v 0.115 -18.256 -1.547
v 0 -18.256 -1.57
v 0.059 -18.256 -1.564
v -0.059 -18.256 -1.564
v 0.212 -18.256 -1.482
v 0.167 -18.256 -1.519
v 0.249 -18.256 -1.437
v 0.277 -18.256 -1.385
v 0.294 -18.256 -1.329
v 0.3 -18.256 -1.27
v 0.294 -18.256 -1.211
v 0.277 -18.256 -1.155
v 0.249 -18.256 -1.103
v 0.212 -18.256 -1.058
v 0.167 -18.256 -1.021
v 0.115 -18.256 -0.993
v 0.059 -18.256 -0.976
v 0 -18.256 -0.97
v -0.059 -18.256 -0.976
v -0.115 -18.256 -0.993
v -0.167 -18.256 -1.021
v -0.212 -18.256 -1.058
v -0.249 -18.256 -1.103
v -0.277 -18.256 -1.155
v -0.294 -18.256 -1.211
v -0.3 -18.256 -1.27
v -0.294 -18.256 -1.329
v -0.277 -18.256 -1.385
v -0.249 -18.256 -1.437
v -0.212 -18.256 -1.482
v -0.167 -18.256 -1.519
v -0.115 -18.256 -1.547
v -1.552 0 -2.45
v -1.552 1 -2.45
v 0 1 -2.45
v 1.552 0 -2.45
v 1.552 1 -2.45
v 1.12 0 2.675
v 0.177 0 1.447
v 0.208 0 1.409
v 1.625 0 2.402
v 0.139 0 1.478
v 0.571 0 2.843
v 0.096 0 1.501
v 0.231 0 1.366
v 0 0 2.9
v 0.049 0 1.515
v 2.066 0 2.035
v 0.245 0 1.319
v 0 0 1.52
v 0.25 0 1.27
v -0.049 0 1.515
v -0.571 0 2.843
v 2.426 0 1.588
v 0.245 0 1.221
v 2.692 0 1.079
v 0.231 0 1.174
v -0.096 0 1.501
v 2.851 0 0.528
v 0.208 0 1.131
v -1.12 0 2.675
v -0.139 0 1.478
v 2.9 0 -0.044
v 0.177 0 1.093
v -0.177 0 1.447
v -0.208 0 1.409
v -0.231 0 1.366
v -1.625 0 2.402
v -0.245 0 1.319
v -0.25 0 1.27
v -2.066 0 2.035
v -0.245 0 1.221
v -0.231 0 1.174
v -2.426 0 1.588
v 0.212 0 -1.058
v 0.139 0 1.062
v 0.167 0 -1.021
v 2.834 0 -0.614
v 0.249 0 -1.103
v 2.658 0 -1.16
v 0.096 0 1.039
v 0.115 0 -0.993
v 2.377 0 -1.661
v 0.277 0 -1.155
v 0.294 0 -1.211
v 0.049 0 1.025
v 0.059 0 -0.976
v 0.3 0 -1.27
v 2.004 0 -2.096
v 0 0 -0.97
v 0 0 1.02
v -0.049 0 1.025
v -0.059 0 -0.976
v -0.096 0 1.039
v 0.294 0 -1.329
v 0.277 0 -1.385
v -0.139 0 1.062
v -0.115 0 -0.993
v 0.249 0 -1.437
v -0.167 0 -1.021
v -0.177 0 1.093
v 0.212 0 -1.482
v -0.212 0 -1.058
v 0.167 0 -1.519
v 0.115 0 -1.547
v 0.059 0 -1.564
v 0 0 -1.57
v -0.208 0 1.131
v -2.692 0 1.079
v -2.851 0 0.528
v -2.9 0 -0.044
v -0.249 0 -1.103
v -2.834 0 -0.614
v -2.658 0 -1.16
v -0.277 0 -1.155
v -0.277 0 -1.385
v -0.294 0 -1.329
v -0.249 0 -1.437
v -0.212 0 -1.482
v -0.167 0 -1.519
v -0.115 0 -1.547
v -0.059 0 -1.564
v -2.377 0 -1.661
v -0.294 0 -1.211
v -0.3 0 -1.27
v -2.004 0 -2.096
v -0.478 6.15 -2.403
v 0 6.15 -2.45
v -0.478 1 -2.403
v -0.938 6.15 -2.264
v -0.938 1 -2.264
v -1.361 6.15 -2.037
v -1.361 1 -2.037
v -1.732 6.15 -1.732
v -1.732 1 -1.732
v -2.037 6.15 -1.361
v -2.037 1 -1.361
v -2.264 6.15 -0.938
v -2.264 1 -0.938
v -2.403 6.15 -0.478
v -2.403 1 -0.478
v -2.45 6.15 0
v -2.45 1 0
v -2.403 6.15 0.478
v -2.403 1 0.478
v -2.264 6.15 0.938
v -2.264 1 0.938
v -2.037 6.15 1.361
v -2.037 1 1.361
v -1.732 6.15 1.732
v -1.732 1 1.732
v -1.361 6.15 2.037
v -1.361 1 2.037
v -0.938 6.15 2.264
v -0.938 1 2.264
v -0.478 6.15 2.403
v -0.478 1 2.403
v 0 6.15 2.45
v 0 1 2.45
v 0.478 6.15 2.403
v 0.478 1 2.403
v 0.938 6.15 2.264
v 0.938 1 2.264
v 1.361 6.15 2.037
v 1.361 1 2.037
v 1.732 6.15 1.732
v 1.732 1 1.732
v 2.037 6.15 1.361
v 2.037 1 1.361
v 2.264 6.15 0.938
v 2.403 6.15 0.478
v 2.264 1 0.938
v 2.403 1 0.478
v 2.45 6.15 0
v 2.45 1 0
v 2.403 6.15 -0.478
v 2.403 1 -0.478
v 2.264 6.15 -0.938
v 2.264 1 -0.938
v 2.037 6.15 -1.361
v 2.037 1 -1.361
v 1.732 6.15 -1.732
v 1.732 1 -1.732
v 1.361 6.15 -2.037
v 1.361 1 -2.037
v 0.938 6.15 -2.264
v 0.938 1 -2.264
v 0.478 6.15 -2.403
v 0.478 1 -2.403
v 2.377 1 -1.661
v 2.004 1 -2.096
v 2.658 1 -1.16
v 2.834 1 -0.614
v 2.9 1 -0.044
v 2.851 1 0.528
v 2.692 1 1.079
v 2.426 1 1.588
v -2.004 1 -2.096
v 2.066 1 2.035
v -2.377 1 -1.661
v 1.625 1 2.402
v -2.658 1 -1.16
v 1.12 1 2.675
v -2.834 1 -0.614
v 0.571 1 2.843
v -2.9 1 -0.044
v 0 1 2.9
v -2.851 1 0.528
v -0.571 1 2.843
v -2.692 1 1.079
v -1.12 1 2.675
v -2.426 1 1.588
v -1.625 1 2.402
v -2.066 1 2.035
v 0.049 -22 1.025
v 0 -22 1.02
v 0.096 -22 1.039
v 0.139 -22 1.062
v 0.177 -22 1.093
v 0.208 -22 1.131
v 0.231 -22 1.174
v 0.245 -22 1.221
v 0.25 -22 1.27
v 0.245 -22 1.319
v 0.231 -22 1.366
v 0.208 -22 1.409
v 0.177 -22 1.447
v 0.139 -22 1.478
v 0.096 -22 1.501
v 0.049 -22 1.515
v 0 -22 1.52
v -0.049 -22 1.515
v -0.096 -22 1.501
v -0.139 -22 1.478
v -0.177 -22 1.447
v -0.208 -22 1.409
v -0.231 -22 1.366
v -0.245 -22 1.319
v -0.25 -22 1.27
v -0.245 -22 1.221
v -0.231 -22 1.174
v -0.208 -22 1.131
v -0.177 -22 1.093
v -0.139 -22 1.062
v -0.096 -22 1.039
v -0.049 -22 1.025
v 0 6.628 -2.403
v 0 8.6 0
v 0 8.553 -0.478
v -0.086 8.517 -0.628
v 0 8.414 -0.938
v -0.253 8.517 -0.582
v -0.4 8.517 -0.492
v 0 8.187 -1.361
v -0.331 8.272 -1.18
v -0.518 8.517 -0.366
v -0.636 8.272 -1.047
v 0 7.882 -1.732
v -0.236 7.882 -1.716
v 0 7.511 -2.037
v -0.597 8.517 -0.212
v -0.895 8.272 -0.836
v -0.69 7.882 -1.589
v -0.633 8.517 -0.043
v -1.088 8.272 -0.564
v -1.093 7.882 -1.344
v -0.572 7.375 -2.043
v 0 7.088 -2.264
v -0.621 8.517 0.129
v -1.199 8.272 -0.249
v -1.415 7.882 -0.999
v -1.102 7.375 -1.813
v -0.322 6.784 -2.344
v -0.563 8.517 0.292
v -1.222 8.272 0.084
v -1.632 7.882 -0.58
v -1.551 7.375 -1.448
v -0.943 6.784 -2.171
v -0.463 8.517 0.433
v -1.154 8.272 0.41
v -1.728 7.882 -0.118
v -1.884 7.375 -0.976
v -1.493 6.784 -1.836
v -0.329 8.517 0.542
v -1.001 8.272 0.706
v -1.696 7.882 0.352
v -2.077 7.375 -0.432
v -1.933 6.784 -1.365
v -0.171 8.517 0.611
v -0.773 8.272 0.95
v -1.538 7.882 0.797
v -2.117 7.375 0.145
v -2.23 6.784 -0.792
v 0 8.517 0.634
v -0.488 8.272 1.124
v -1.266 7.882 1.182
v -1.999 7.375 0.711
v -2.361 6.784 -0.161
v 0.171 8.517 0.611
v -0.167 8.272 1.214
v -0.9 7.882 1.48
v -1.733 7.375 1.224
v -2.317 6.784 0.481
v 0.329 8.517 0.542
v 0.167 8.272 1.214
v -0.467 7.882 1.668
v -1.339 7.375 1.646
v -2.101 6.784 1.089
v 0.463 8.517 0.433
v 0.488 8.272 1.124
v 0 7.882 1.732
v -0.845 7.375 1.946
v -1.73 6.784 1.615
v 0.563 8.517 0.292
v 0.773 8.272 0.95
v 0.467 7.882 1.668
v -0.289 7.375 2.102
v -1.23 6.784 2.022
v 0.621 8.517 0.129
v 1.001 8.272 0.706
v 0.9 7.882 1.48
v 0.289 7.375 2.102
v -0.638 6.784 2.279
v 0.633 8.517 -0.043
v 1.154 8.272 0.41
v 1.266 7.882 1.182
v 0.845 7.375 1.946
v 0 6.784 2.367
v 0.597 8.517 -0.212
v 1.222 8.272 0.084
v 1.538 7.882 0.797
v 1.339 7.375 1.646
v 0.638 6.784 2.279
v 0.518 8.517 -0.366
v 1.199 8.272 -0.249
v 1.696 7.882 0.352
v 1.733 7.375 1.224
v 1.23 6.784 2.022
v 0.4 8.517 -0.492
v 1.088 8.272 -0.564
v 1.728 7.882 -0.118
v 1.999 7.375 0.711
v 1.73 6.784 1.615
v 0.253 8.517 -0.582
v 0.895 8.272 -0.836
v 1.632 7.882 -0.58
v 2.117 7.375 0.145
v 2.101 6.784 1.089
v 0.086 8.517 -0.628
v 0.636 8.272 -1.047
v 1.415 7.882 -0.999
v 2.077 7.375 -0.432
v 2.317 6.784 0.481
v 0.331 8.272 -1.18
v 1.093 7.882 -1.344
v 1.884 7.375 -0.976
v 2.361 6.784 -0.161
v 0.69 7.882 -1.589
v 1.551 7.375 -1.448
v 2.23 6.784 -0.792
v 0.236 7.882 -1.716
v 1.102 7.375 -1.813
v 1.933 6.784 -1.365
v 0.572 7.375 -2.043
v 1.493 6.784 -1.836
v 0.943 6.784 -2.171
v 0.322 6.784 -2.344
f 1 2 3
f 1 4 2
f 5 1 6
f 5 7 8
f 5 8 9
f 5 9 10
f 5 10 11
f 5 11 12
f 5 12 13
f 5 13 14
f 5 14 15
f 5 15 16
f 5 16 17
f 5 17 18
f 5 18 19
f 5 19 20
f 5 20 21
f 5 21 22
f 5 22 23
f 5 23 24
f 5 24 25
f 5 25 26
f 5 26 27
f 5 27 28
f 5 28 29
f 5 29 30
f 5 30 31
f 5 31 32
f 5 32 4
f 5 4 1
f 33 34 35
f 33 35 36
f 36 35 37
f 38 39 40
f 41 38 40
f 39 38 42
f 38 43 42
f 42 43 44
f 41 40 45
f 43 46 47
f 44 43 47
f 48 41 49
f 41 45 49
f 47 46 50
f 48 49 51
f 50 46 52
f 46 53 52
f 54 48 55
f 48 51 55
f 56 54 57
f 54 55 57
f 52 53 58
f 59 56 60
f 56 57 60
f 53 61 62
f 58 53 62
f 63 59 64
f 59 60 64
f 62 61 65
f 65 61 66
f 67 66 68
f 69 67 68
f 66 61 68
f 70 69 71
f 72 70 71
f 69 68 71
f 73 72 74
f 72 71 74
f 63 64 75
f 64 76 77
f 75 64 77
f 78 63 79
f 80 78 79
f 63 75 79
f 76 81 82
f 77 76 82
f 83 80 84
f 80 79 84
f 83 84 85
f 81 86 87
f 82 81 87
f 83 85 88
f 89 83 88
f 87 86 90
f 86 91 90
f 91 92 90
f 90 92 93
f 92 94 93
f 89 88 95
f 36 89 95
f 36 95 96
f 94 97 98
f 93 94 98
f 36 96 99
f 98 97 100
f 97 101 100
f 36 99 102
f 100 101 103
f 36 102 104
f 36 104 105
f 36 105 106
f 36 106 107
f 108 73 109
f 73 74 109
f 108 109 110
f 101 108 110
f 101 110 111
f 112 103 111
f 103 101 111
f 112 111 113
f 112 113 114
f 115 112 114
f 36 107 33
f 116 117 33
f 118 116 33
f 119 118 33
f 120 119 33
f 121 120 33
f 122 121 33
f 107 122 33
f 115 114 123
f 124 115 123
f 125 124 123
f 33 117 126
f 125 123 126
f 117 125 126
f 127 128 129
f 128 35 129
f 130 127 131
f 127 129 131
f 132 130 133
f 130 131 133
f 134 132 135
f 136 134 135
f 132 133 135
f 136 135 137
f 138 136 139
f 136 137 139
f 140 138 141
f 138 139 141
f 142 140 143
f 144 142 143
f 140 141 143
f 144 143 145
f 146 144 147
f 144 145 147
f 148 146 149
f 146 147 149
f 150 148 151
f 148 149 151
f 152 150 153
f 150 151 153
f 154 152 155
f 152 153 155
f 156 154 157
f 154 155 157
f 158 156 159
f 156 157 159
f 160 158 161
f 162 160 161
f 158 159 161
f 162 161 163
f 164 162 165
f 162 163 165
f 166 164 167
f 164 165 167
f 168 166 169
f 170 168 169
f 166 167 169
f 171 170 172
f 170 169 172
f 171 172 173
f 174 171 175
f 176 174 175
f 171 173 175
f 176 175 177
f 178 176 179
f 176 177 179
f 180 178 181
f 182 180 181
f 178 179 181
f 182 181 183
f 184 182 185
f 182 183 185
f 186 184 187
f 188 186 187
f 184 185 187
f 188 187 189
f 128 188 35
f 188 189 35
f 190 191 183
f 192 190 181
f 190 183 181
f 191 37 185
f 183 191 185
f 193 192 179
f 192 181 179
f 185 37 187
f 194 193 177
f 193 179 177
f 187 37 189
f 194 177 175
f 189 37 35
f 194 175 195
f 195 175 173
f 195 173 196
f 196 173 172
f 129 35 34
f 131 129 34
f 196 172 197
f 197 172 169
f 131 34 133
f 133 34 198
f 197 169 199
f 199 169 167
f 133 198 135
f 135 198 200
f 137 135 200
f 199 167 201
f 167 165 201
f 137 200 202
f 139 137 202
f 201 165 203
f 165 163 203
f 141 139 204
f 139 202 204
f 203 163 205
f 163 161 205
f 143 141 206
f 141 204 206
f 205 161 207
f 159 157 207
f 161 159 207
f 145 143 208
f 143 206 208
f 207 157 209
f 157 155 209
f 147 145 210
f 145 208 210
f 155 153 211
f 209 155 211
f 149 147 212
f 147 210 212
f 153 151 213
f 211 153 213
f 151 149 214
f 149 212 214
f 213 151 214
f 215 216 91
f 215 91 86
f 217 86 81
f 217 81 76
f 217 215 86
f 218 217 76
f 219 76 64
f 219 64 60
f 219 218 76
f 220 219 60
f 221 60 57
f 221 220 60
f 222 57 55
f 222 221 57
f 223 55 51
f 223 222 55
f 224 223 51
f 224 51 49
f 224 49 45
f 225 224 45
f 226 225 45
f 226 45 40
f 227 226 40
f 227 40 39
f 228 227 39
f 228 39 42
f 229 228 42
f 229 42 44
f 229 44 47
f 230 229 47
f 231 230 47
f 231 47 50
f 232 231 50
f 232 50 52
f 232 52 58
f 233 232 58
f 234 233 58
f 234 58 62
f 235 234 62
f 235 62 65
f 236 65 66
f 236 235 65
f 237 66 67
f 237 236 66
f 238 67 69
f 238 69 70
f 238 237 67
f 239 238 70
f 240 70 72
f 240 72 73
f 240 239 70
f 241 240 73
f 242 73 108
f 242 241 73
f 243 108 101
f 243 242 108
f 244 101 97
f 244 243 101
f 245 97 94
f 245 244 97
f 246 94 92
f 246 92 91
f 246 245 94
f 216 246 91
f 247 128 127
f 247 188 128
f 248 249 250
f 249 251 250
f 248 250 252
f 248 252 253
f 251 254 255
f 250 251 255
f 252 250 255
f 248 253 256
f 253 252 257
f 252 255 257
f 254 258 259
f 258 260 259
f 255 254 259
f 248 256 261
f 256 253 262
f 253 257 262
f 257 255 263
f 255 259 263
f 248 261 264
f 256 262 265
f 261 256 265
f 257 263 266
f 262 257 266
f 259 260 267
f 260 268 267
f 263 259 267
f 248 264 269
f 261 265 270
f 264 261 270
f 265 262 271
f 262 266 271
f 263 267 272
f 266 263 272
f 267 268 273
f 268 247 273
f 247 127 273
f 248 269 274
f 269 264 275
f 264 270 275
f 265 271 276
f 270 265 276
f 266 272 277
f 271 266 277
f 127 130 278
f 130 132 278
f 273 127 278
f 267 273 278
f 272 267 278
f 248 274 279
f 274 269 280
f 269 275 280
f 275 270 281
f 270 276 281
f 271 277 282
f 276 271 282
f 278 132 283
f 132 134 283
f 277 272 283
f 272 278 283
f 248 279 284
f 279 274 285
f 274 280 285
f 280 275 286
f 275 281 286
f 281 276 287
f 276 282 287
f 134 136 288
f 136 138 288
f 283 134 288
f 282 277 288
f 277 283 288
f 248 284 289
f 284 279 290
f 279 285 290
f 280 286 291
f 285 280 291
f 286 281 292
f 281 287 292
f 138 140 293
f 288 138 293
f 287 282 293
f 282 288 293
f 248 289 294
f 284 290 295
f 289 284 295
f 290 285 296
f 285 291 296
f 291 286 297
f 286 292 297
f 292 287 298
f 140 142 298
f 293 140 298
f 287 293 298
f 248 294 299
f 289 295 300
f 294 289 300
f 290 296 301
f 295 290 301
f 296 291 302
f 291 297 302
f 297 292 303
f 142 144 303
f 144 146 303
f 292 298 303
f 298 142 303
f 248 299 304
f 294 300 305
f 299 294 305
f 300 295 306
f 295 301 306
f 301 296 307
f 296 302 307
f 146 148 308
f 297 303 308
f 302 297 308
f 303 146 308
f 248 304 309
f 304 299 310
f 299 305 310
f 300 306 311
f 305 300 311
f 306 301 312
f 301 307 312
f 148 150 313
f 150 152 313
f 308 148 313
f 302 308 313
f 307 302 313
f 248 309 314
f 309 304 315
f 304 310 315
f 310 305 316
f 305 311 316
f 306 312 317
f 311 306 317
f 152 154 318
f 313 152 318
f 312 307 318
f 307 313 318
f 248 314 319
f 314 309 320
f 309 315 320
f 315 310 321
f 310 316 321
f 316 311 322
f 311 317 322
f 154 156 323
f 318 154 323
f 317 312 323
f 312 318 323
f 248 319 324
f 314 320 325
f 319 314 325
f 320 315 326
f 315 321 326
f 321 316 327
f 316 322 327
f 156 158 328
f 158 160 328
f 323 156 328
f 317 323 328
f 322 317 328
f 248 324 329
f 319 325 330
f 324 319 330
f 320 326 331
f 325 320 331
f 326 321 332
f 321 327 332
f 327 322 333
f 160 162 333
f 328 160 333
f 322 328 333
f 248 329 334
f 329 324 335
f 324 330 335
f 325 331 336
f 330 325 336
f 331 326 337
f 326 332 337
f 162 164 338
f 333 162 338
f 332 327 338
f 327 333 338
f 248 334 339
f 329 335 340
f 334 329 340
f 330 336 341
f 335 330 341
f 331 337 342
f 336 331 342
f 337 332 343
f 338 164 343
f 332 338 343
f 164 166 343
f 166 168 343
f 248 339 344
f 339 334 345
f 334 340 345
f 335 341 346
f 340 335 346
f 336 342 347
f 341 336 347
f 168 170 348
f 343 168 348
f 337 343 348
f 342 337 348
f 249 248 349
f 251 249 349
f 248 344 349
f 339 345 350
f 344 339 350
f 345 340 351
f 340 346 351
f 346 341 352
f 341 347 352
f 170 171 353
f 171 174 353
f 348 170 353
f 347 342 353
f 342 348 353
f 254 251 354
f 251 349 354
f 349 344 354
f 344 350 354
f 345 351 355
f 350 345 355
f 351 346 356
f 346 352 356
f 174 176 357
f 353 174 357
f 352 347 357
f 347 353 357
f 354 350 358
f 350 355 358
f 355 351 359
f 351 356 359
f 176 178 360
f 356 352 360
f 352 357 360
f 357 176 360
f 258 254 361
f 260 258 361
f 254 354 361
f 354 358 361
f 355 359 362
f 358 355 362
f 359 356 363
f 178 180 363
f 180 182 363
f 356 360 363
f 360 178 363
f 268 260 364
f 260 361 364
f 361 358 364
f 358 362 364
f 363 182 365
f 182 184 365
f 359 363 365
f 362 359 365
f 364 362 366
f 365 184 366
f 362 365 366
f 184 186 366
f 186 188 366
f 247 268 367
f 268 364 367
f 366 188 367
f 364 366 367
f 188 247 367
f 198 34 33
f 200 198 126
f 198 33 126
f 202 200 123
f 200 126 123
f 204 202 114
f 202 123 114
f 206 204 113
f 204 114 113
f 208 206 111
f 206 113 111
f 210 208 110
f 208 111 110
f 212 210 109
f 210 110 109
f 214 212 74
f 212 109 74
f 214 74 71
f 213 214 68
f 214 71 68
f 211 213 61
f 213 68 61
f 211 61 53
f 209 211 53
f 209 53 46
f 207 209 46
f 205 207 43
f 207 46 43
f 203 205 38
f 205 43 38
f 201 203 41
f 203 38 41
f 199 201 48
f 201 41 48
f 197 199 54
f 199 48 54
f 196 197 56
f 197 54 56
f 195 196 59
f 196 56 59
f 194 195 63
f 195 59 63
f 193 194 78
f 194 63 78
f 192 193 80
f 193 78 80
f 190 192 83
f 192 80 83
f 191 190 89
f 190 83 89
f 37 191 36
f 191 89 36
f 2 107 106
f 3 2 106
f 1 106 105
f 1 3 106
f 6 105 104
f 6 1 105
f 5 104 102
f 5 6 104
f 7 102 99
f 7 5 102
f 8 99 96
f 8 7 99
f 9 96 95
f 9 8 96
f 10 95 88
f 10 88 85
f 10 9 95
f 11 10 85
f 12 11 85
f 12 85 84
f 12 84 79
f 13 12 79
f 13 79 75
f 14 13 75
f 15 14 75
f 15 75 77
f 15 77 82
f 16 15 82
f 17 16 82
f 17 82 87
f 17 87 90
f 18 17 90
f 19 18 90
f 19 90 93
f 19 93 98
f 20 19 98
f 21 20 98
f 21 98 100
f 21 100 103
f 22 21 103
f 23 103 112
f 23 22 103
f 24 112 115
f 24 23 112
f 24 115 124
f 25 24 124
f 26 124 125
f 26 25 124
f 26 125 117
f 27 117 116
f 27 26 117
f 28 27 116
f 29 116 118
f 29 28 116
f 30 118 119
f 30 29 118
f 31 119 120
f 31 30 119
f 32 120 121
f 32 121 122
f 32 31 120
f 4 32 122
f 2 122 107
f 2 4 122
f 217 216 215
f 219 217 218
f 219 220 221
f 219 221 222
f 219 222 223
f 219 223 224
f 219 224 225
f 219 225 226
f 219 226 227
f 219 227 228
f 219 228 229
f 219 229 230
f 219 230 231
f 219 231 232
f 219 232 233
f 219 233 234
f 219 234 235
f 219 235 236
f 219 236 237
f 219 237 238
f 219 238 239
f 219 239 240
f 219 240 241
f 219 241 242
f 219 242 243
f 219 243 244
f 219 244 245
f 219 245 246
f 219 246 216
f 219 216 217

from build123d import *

# Parameters (mm, degrees)
CUT_EXTRUDE1_DEPTH = 10
SWEEP1_PROFILE_R   = 0.3
SWEEP2_PROFILE_R   = 0.25


with BuildPart() as part:
    # Sketch1 → Revolve1 (revolve)
    with BuildSketch(Plane(origin=(0, 0, 0), x_dir=(0, 0, -1), z_dir=(1, 0, 0))):
        with BuildLine():
            Line((0, 0), (0, 8.6))
            ThreePointArc((0, 8.6), (1.732411614, 7.882411614), (2.45, 6.15))
            Line((2.45, 6.15), (2.45, 1))
            Line((2.45, 1), (2.9, 1))
            Line((2.9, 1), (2.9, 0))
            Line((2.9, 0), (0, 0))
        make_face()
    revolve(axis=Axis((0, 0, 0), (0, 1, 0)))

    # Sketch2 → Cut-Extrude1 (cut)
    with BuildSketch(Plane(origin=(0, 1, 0), x_dir=(1, 0, 0), z_dir=(0, 1, 0))):
        Polygon((0, 2.45), (-2.000825275, 2.45), (-0.041843052, 4.408982223), (3.123853817, 2.45), align=None)
    extrude(amount=-CUT_EXTRUDE1_DEPTH, mode=Mode.SUBTRACT)

    # Sweep1: sweep along a path in Sketch3
    with BuildLine(Plane(origin=(0, 0, 0), x_dir=(0, 0, -1), z_dir=(1, 0, 0))) as sweep1_path:
        Line((1.27, 0), (1.27, -18.255708098))
    # Sweep1 profile (on start of the path) → Sweep1 (sweep)
    with BuildSketch(Plane(origin=(0, 0, -1.27), x_dir=(0, 0, -1), z_dir=(0, -1, 0))):
        Circle(SWEEP1_PROFILE_R)
    sweep(path=sweep1_path.line)

    # Sweep2: sweep along a path in Sketch3<3>
    with BuildLine(Plane(origin=(0, 0, 0), x_dir=(0, 0, -1), z_dir=(1, 0, 0))) as sweep2_path:
        Line((-1.27, 0), (-1.27, -22))
    # Sweep2 profile (on start of the path) → Sweep2 (sweep)
    with BuildSketch(Plane(origin=(0, 0, 1.27), x_dir=(0, 0, -1), z_dir=(0, -1, 0))):
        Circle(SWEEP2_PROFILE_R)
    sweep(path=sweep2_path.line)


solid = part.part
